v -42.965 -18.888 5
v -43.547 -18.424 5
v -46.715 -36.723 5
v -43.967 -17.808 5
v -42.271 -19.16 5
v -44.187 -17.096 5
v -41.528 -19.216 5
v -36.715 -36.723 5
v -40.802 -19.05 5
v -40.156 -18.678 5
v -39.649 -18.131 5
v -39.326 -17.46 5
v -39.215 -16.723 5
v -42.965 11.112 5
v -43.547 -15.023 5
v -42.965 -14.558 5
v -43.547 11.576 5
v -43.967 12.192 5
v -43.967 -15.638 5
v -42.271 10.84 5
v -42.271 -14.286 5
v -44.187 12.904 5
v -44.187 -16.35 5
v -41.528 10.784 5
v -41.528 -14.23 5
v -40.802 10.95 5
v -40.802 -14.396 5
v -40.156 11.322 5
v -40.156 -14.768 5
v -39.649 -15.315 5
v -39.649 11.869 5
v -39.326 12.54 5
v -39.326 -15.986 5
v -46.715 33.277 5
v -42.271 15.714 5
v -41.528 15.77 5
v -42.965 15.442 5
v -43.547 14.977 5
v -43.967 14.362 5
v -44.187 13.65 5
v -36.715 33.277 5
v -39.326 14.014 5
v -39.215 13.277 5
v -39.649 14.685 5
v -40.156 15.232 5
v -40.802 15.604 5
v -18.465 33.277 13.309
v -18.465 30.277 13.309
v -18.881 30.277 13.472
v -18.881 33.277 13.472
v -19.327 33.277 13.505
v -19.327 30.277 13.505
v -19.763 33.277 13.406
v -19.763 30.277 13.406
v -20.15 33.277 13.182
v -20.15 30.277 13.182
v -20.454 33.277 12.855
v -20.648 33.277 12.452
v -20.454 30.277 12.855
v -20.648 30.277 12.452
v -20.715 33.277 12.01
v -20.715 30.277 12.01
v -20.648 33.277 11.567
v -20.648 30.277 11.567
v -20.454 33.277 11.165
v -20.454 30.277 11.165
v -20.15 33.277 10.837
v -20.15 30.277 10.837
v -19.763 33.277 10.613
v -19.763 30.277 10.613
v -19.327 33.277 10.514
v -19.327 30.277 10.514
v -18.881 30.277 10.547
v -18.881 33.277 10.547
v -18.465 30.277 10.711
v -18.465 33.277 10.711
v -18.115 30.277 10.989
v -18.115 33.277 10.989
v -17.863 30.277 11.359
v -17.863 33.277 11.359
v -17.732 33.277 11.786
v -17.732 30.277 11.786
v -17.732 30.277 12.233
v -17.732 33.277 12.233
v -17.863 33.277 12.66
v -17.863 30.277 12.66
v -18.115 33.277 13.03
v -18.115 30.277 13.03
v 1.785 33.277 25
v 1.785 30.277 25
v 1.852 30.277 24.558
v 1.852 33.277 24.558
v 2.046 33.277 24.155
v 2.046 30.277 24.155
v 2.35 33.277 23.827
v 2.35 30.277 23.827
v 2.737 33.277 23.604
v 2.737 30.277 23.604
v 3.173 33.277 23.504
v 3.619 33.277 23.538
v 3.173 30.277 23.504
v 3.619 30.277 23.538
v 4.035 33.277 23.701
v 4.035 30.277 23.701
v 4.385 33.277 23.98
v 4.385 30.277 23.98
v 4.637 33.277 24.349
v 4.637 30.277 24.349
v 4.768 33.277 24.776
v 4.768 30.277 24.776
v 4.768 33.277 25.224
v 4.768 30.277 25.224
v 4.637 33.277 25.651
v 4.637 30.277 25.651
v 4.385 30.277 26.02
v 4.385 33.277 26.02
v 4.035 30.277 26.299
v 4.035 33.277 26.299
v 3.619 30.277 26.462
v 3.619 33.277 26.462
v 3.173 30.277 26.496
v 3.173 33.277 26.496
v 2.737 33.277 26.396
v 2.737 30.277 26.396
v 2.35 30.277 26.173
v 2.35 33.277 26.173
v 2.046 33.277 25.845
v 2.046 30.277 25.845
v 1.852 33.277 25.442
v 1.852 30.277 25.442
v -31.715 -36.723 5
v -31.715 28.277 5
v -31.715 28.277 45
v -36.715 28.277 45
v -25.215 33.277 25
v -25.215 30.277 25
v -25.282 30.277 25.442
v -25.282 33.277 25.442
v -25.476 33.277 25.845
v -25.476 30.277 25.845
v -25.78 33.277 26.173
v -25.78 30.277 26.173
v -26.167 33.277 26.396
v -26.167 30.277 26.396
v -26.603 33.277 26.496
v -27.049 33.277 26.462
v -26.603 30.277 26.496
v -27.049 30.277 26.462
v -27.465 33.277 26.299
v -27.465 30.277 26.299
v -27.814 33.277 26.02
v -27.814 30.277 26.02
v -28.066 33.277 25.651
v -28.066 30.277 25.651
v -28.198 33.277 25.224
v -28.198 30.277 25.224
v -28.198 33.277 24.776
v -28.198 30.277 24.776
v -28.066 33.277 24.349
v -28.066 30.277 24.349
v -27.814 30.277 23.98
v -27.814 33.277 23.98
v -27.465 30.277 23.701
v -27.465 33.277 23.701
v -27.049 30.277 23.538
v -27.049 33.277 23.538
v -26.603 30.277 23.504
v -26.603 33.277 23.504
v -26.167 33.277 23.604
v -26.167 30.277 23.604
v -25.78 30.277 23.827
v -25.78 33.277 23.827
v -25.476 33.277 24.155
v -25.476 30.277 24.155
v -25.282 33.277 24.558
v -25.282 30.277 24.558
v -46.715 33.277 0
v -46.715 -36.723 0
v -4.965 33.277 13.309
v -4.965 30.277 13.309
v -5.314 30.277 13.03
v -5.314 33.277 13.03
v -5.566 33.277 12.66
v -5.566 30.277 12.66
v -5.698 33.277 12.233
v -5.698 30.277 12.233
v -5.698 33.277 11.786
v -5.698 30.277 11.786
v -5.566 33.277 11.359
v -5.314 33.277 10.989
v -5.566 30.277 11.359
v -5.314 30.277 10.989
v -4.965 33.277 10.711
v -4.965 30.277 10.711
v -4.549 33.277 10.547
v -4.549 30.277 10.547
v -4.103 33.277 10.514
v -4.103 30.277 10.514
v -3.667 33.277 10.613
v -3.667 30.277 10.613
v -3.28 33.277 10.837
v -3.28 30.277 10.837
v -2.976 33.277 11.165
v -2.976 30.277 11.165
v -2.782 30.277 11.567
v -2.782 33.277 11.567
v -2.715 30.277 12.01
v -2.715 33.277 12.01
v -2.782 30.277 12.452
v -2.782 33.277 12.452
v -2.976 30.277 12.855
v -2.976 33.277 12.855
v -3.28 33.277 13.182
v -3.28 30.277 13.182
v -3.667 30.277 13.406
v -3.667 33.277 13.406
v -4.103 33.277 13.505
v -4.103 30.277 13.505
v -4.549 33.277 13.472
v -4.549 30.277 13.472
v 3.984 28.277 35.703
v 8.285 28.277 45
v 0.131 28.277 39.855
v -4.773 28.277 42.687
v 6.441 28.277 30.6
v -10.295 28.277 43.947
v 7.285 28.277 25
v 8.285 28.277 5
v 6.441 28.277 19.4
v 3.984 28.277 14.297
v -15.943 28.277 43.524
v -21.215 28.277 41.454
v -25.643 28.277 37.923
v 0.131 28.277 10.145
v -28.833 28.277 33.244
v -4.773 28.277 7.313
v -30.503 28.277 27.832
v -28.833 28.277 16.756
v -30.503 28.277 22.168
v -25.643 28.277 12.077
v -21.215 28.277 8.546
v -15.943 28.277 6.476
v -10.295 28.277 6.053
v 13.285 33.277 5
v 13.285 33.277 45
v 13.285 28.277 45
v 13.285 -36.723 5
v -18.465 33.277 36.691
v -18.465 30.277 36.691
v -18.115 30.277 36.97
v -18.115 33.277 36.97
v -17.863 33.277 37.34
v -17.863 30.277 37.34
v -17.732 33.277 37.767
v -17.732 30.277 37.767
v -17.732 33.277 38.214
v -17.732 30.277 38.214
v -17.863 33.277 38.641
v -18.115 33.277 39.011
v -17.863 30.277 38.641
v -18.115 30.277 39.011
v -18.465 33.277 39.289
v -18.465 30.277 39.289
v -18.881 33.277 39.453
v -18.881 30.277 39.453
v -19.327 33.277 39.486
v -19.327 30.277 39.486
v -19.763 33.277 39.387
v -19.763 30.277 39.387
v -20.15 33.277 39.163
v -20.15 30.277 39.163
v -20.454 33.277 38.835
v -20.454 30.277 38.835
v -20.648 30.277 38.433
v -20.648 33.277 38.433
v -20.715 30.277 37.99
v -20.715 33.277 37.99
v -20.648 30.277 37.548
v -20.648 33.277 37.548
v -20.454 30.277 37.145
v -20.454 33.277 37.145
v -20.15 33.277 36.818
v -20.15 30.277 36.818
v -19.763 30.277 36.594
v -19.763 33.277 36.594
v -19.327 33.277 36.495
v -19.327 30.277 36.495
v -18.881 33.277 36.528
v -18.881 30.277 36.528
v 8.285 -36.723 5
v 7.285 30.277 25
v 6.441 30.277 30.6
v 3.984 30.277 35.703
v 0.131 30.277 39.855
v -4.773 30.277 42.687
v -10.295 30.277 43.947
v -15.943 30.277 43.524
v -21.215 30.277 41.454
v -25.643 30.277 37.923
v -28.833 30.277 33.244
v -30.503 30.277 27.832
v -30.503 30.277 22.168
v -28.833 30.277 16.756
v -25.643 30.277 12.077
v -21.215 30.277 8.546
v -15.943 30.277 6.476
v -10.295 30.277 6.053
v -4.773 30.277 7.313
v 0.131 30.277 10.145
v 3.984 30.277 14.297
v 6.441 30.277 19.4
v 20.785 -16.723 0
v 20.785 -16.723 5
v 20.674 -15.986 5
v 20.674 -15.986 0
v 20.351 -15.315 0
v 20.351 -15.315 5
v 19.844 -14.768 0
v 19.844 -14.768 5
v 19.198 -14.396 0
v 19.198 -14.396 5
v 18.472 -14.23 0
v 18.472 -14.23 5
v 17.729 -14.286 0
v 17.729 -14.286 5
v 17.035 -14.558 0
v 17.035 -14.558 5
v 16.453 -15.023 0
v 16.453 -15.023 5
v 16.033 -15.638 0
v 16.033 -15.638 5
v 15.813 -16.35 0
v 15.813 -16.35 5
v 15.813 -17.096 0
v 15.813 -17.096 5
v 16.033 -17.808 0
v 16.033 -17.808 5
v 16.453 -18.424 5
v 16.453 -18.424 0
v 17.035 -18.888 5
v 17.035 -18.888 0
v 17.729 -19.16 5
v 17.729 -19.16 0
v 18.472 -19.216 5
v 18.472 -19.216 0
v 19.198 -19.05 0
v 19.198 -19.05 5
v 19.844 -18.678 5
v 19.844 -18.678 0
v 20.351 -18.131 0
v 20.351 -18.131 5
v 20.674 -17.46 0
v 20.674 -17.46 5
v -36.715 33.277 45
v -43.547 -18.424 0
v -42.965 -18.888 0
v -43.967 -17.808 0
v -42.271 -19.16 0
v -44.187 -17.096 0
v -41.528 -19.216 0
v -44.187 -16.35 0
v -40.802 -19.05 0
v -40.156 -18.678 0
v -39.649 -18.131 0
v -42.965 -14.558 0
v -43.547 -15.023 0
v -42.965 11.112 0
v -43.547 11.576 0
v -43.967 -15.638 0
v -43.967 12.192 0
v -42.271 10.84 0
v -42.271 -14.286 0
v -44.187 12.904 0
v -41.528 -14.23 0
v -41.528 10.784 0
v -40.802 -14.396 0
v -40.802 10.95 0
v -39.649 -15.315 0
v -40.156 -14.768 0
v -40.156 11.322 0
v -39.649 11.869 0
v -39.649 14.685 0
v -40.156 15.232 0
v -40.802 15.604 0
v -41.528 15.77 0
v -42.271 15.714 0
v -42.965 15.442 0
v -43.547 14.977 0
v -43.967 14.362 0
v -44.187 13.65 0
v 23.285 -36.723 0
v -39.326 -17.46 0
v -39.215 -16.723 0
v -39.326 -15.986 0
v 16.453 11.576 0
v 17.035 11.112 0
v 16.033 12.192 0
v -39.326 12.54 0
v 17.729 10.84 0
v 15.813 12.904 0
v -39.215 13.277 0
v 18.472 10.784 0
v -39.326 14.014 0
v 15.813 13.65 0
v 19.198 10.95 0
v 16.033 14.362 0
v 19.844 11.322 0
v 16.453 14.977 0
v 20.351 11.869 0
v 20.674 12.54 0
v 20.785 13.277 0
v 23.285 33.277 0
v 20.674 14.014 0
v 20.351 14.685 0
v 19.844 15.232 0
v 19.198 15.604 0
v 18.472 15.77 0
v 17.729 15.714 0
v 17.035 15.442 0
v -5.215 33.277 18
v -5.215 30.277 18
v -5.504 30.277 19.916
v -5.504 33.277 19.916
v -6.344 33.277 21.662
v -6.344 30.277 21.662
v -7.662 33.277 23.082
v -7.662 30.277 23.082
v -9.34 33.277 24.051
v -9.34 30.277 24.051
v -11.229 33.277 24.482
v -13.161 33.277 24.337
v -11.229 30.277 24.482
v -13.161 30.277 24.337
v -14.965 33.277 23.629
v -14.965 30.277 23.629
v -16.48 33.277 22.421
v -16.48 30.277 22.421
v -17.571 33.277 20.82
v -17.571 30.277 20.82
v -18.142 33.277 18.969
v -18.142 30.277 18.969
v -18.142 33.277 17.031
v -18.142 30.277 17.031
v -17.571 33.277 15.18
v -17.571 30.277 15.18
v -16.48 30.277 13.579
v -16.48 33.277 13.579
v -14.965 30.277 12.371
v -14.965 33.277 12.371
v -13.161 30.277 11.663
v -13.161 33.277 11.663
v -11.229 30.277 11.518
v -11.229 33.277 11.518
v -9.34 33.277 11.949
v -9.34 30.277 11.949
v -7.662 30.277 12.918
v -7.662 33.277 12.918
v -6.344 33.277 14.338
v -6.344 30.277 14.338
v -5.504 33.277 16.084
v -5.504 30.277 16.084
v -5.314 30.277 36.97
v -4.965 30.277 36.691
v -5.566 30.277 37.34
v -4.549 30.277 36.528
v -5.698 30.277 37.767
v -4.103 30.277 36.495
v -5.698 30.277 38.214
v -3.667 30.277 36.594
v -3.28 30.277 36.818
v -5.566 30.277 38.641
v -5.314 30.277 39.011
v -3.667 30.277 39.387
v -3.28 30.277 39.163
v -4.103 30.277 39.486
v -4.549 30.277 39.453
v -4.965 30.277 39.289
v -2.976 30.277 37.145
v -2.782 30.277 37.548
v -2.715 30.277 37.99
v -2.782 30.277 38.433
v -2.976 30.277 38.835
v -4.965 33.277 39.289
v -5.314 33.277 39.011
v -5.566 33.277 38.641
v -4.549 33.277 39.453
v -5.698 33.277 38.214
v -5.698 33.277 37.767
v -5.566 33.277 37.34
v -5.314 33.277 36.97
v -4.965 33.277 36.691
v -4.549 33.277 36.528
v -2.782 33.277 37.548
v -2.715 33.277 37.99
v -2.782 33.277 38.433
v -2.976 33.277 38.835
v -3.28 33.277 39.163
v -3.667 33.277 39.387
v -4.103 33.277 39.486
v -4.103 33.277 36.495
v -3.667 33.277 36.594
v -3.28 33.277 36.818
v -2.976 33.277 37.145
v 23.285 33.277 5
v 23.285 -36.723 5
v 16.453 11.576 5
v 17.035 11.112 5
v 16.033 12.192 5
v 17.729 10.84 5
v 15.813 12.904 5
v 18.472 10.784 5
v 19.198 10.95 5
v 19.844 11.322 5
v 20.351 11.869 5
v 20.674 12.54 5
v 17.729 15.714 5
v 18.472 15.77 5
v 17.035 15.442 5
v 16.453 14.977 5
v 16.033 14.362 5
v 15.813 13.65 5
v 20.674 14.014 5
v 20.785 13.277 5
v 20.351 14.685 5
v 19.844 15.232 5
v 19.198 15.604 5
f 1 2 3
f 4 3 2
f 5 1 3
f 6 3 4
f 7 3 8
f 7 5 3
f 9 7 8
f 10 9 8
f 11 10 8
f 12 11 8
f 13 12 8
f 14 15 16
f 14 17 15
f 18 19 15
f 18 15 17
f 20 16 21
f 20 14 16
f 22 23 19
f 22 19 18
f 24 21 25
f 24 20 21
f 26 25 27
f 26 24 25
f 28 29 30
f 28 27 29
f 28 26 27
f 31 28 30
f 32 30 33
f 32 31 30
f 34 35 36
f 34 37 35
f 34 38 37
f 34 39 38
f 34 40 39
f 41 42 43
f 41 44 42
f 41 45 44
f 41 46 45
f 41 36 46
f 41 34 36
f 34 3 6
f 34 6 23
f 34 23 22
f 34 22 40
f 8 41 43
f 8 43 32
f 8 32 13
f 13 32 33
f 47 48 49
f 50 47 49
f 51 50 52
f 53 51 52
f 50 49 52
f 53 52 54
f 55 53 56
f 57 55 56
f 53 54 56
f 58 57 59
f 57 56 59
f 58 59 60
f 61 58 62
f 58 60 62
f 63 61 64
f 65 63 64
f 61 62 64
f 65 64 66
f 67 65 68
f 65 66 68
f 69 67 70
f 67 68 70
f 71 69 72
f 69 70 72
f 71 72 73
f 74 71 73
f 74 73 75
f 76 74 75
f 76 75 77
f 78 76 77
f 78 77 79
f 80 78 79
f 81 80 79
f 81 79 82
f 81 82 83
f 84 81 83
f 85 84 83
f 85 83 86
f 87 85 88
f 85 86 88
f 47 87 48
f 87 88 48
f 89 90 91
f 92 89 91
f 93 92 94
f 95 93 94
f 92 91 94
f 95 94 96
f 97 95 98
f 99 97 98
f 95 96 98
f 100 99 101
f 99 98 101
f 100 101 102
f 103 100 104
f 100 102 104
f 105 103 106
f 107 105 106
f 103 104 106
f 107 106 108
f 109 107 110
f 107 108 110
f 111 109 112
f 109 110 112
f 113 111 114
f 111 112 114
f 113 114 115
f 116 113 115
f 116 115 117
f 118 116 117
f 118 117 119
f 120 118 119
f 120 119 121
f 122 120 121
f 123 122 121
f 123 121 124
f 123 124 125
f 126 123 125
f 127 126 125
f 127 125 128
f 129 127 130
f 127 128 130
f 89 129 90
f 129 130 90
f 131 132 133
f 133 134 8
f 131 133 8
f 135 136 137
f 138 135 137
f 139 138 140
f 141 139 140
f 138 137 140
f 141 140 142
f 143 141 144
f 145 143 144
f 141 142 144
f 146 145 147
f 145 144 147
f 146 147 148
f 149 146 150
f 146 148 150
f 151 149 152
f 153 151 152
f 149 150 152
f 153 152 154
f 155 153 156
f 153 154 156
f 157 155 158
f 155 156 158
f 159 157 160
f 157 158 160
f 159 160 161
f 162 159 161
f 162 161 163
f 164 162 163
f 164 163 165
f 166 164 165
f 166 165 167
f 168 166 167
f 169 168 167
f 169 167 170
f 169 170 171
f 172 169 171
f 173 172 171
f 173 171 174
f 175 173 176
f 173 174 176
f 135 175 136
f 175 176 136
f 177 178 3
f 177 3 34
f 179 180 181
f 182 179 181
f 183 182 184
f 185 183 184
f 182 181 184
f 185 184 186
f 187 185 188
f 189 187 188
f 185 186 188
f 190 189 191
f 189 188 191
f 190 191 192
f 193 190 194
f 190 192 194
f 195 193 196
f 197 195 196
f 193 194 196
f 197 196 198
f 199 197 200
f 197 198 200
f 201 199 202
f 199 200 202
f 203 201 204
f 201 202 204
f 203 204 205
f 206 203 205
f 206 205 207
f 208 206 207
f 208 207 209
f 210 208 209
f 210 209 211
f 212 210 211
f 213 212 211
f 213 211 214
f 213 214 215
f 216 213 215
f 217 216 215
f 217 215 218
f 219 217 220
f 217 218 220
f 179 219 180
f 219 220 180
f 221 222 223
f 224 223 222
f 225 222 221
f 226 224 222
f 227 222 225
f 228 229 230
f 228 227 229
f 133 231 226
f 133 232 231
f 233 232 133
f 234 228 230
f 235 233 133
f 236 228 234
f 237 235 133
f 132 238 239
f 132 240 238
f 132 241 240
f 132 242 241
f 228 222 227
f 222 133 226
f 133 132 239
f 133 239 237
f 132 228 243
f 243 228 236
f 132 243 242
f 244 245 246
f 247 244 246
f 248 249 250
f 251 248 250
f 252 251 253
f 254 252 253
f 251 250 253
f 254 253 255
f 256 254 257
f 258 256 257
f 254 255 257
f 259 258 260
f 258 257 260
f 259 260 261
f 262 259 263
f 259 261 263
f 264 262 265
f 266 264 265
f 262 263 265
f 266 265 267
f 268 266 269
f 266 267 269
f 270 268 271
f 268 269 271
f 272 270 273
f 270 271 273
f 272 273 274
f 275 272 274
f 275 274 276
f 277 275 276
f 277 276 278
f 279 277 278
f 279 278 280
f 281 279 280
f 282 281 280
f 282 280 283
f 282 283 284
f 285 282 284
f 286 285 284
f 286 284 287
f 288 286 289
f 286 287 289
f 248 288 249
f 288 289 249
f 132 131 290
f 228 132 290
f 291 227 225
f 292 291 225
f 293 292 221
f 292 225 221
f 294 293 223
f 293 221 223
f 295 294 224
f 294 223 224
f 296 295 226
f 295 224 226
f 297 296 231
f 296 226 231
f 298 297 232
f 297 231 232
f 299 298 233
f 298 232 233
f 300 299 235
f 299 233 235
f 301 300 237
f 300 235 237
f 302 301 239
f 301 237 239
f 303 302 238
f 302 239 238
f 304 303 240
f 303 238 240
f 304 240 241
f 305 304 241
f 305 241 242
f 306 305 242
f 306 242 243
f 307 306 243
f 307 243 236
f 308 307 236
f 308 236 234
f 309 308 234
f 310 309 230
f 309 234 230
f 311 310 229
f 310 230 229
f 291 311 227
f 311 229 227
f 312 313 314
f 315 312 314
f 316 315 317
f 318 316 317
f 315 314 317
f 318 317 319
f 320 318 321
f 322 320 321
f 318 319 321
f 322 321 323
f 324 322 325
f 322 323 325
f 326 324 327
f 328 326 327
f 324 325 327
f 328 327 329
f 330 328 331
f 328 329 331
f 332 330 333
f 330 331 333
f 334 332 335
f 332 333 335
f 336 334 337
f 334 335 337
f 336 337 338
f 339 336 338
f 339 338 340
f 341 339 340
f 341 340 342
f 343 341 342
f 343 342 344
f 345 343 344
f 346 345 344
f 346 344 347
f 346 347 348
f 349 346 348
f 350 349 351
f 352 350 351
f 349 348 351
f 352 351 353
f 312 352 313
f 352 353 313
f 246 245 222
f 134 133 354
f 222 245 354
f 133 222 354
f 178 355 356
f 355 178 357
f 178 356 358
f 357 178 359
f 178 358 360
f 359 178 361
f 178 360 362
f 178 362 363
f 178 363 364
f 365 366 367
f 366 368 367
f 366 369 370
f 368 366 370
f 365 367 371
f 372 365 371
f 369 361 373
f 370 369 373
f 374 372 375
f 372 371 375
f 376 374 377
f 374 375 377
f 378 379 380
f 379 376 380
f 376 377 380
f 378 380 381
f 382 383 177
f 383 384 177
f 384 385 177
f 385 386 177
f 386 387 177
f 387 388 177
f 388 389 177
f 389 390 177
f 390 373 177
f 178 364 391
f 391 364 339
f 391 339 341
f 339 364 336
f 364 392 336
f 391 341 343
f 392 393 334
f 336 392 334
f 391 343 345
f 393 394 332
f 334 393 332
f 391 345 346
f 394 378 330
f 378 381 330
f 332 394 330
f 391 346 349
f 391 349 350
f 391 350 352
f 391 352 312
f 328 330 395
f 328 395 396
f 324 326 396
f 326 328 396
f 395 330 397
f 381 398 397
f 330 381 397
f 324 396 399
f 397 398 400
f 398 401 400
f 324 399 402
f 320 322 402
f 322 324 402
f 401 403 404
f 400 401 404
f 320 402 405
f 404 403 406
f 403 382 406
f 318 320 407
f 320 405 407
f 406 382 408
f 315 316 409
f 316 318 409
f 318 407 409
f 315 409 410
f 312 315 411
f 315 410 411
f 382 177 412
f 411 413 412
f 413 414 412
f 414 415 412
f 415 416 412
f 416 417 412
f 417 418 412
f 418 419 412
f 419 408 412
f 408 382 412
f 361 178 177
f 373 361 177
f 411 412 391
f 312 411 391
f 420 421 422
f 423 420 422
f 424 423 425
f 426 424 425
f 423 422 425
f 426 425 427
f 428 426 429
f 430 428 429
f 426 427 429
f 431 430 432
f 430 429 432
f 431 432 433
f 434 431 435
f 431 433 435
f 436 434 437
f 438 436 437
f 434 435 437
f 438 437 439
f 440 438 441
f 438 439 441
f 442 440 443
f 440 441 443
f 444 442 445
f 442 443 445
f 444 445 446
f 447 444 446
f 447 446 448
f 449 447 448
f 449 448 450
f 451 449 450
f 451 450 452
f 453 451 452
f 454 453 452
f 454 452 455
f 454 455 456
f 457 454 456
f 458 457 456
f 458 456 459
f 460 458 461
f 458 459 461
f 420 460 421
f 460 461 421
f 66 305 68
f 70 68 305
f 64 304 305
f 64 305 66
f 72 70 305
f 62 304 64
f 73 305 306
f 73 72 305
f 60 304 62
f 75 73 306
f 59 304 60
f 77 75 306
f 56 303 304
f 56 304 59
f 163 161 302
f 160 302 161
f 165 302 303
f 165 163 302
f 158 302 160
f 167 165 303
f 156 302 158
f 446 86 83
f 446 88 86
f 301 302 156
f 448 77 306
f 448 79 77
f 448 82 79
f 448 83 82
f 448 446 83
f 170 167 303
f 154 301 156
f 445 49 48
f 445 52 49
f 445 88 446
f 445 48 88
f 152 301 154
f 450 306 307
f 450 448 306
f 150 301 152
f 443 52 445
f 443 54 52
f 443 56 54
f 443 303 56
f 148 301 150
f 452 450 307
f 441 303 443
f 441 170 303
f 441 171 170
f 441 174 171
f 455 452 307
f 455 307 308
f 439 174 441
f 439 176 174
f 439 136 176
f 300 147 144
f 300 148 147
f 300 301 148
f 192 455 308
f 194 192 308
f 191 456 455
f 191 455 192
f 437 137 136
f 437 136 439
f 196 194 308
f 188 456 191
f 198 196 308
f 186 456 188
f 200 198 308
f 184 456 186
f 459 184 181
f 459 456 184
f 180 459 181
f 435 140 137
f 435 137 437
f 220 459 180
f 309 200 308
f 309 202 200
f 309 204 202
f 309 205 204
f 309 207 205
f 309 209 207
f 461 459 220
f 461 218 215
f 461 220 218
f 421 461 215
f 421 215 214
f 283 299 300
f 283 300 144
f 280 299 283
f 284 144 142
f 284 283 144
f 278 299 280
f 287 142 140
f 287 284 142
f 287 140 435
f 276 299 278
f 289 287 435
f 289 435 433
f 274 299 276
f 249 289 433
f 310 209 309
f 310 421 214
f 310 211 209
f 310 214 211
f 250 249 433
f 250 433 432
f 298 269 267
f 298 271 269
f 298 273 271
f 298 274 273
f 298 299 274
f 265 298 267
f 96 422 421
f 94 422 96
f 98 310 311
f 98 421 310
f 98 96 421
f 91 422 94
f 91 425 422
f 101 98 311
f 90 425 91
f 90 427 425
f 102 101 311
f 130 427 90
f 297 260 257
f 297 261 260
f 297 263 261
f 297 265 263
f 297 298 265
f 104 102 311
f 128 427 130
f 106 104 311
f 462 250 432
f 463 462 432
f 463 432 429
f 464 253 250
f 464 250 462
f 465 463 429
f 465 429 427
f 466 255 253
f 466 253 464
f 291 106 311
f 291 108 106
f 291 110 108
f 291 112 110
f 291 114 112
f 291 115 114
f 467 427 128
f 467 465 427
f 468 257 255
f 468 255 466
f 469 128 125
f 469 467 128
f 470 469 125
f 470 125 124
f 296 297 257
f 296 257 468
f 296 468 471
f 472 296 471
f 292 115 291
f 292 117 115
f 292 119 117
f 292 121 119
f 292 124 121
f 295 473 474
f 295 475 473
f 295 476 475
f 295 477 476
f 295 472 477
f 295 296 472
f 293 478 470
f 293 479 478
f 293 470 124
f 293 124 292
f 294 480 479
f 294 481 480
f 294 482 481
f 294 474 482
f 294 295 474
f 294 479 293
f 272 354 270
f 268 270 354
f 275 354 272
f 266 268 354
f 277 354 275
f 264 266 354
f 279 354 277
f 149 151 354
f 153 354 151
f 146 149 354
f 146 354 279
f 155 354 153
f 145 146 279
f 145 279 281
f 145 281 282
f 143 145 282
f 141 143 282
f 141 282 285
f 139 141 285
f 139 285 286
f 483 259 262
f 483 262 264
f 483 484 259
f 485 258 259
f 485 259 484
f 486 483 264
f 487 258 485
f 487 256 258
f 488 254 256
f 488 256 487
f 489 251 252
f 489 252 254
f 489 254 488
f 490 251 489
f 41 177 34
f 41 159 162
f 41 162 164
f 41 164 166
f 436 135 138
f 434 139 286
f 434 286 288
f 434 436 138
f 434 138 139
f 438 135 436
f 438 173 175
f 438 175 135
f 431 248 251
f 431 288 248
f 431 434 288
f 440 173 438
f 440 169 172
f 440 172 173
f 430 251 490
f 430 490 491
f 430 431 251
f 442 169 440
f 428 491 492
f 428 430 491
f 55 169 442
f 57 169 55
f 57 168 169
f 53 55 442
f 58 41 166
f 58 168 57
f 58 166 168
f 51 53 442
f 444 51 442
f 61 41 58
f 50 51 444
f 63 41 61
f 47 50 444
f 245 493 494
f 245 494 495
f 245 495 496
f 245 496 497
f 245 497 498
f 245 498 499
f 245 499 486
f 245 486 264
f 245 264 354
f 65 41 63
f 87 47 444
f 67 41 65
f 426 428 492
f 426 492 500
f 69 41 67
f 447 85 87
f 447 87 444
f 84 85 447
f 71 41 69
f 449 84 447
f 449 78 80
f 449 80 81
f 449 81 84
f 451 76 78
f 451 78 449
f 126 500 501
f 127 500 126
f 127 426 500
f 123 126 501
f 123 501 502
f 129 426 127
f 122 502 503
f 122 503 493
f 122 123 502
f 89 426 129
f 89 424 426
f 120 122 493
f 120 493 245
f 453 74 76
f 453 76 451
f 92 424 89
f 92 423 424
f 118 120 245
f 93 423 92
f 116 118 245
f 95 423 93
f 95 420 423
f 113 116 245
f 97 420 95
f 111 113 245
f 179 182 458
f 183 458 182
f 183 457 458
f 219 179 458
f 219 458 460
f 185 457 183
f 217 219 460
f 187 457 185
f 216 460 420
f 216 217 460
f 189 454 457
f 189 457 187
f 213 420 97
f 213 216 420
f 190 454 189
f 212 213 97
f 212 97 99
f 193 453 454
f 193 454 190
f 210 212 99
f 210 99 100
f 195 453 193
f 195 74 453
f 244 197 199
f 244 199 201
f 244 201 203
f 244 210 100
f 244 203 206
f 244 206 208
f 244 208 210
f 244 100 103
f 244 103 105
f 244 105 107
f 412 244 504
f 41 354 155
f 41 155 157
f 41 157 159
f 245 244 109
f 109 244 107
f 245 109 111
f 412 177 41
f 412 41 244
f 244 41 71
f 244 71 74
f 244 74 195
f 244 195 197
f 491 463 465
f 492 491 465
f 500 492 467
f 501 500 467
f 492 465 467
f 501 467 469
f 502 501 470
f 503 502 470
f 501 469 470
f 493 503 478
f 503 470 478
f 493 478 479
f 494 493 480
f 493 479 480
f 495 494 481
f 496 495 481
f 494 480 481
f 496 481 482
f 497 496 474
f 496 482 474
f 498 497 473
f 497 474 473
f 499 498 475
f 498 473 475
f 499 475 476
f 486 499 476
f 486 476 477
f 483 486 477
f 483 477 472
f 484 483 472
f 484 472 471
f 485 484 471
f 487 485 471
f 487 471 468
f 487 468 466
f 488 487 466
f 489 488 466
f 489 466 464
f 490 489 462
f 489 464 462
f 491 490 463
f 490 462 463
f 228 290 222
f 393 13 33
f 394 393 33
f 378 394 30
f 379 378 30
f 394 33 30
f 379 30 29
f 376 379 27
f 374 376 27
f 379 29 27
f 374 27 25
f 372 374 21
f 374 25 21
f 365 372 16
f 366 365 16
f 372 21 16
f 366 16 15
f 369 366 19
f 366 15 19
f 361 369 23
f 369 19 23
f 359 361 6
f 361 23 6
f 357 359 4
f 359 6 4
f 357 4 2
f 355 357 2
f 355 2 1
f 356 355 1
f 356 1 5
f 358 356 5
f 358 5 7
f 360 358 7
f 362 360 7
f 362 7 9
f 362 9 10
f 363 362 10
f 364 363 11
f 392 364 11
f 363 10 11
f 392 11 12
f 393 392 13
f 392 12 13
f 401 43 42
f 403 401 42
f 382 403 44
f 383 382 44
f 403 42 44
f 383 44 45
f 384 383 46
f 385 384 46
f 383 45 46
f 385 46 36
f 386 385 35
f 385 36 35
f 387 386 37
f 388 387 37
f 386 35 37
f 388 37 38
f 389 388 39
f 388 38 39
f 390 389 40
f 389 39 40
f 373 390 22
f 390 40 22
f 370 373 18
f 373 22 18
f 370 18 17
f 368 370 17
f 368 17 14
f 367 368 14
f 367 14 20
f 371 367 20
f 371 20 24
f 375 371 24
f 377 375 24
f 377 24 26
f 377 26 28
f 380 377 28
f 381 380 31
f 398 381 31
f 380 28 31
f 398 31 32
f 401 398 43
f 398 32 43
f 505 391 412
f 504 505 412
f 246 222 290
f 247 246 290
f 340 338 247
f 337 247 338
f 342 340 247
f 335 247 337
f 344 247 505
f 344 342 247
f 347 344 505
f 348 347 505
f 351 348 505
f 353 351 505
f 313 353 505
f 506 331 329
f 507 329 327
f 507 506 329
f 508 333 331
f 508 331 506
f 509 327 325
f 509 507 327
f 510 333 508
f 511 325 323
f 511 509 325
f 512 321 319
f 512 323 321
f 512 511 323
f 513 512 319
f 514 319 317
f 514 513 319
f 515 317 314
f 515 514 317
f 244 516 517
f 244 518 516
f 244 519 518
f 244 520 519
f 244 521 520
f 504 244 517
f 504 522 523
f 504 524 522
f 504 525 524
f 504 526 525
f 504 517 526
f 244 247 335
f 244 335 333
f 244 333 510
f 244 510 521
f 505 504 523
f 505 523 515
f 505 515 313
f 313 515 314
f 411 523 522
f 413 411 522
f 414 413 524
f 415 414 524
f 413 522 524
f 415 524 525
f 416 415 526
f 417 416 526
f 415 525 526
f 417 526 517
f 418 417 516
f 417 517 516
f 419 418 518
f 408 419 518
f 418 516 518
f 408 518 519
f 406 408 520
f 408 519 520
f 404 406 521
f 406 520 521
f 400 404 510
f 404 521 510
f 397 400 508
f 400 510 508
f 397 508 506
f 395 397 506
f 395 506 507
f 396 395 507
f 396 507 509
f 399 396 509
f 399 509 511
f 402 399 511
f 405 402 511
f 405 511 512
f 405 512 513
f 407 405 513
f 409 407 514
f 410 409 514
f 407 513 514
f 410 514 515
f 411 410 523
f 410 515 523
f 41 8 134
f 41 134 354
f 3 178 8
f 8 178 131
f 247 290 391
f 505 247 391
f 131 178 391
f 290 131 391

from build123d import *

# Parameters (mm, degrees)
ESQUISSE1_W                  = 70
ESQUISSE1_H                  = 70
BOSS_EXTRU_1_DEPTH           = 5
BOSS_EXTRU_2_DEPTH           = 40
ENL_V_MAT_EXTRU_1_DEPTH      = 50
ESQUISSE5_R                  = 2.5
ENL_V_MAT_EXTRU_2_DEPTH      = 5
ESQUISSE6_R                  = 19
ENL_V_MAT_EXTRU_3_DEPTH      = 2
ESQUISSE7_R                  = 6.5
ENL_V_MAT_EXTRU_4_DEPTH      = 3
ESQUISSE10_R                 = 1.5
ENL_V_MAT_EXTRU_5_DEPTH      = 3
R_P_TITION_CIRCULAIRE1_COUNT = 6


with BuildPart() as part:
    # Esquisse1 → Boss.-Extru.1 (new body)
    with BuildSketch(Plane.XY):
        with Locations((-11.714867345, -1.723076923)):
            Rectangle(ESQUISSE1_W, ESQUISSE1_H)
    extrude(amount=BOSS_EXTRU_1_DEPTH)

    # Esquisse3 → Boss.-Extru.2 (add)
    with BuildSketch(Plane.XY.offset(5)):
        Polygon((-36.714867345, -36.723076923), (-36.714867345, 33.276923077), (13.285132655, 33.276923077), (13.285132655, -36.723076923), (8.285132655, -36.723076923), (8.285132655, 28.276923077), (-31.714867345, 28.276923077), (-31.714867345, -36.723076923), align=None)
    extrude(amount=BOSS_EXTRU_2_DEPTH)

    # Esquisse4 → Enlèv. mat.-Extru.1 (cut)
    with BuildSketch(Plane.ZY.offset(36.714867345)):
        Polygon((45, 28.276923077), (5, -36.723076923), (45, -36.723076923), align=None)
    extrude(amount=-ENL_V_MAT_EXTRU_1_DEPTH, mode=Mode.SUBTRACT)

    # Esquisse5 → Enlèv. mat.-Extru.2 (cut)
    with BuildSketch(Plane.XY.offset(5)):
        with Locations((-41.714867345, 13.276923077)):
            Circle(ESQUISSE5_R)
        with Locations((-41.714867345, -16.723076923)):
            Circle(ESQUISSE5_R)
        with Locations((18.285132655, -16.723076923)):
            Circle(ESQUISSE5_R)
        with Locations((18.285132655, 13.276923077)):
            Circle(ESQUISSE5_R)
    extrude(amount=-ENL_V_MAT_EXTRU_2_DEPTH, mode=Mode.SUBTRACT)

    # Esquisse6 → Enlèv. mat.-Extru.3 (cut)
    with BuildSketch(Plane.XZ.offset(-28.276923077)):
        with Locations((-11.714867345, 25)):
            Circle(ESQUISSE6_R)
    extrude(amount=-ENL_V_MAT_EXTRU_3_DEPTH, mode=Mode.SUBTRACT)

    # Esquisse7 → Enlèv. mat.-Extru.4 (cut)
    with BuildSketch(Plane.XZ.offset(-30.276923077)):
        with Locations((-11.714867345, 18)):
            Circle(ESQUISSE7_R)
    extrude(amount=-ENL_V_MAT_EXTRU_4_DEPTH, mode=Mode.SUBTRACT)

    # Esquisse10 → Enlèv. mat.-Extru.5 (cut)
    with BuildSketch(Plane.XZ.offset(-30.276923077)):
        with Locations((-26.714867345, 25)):
            Circle(ESQUISSE10_R)
    enl_v_mat_extru_5 = extrude(amount=-ENL_V_MAT_EXTRU_5_DEPTH, mode=Mode.SUBTRACT)

    # Répétition circulaire1: Enlèv. mat.-Extru.5 ×6 about axis
    r_p_tition_circulaire1_axis = Axis((-11.714867345, 0, 25), (0, 1, 0))
    for i in range(1, R_P_TITION_CIRCULAIRE1_COUNT):
        add(enl_v_mat_extru_5.rotate(r_p_tition_circulaire1_axis, i * 360 / R_P_TITION_CIRCULAIRE1_COUNT), mode=Mode.SUBTRACT)


solid = part.part
